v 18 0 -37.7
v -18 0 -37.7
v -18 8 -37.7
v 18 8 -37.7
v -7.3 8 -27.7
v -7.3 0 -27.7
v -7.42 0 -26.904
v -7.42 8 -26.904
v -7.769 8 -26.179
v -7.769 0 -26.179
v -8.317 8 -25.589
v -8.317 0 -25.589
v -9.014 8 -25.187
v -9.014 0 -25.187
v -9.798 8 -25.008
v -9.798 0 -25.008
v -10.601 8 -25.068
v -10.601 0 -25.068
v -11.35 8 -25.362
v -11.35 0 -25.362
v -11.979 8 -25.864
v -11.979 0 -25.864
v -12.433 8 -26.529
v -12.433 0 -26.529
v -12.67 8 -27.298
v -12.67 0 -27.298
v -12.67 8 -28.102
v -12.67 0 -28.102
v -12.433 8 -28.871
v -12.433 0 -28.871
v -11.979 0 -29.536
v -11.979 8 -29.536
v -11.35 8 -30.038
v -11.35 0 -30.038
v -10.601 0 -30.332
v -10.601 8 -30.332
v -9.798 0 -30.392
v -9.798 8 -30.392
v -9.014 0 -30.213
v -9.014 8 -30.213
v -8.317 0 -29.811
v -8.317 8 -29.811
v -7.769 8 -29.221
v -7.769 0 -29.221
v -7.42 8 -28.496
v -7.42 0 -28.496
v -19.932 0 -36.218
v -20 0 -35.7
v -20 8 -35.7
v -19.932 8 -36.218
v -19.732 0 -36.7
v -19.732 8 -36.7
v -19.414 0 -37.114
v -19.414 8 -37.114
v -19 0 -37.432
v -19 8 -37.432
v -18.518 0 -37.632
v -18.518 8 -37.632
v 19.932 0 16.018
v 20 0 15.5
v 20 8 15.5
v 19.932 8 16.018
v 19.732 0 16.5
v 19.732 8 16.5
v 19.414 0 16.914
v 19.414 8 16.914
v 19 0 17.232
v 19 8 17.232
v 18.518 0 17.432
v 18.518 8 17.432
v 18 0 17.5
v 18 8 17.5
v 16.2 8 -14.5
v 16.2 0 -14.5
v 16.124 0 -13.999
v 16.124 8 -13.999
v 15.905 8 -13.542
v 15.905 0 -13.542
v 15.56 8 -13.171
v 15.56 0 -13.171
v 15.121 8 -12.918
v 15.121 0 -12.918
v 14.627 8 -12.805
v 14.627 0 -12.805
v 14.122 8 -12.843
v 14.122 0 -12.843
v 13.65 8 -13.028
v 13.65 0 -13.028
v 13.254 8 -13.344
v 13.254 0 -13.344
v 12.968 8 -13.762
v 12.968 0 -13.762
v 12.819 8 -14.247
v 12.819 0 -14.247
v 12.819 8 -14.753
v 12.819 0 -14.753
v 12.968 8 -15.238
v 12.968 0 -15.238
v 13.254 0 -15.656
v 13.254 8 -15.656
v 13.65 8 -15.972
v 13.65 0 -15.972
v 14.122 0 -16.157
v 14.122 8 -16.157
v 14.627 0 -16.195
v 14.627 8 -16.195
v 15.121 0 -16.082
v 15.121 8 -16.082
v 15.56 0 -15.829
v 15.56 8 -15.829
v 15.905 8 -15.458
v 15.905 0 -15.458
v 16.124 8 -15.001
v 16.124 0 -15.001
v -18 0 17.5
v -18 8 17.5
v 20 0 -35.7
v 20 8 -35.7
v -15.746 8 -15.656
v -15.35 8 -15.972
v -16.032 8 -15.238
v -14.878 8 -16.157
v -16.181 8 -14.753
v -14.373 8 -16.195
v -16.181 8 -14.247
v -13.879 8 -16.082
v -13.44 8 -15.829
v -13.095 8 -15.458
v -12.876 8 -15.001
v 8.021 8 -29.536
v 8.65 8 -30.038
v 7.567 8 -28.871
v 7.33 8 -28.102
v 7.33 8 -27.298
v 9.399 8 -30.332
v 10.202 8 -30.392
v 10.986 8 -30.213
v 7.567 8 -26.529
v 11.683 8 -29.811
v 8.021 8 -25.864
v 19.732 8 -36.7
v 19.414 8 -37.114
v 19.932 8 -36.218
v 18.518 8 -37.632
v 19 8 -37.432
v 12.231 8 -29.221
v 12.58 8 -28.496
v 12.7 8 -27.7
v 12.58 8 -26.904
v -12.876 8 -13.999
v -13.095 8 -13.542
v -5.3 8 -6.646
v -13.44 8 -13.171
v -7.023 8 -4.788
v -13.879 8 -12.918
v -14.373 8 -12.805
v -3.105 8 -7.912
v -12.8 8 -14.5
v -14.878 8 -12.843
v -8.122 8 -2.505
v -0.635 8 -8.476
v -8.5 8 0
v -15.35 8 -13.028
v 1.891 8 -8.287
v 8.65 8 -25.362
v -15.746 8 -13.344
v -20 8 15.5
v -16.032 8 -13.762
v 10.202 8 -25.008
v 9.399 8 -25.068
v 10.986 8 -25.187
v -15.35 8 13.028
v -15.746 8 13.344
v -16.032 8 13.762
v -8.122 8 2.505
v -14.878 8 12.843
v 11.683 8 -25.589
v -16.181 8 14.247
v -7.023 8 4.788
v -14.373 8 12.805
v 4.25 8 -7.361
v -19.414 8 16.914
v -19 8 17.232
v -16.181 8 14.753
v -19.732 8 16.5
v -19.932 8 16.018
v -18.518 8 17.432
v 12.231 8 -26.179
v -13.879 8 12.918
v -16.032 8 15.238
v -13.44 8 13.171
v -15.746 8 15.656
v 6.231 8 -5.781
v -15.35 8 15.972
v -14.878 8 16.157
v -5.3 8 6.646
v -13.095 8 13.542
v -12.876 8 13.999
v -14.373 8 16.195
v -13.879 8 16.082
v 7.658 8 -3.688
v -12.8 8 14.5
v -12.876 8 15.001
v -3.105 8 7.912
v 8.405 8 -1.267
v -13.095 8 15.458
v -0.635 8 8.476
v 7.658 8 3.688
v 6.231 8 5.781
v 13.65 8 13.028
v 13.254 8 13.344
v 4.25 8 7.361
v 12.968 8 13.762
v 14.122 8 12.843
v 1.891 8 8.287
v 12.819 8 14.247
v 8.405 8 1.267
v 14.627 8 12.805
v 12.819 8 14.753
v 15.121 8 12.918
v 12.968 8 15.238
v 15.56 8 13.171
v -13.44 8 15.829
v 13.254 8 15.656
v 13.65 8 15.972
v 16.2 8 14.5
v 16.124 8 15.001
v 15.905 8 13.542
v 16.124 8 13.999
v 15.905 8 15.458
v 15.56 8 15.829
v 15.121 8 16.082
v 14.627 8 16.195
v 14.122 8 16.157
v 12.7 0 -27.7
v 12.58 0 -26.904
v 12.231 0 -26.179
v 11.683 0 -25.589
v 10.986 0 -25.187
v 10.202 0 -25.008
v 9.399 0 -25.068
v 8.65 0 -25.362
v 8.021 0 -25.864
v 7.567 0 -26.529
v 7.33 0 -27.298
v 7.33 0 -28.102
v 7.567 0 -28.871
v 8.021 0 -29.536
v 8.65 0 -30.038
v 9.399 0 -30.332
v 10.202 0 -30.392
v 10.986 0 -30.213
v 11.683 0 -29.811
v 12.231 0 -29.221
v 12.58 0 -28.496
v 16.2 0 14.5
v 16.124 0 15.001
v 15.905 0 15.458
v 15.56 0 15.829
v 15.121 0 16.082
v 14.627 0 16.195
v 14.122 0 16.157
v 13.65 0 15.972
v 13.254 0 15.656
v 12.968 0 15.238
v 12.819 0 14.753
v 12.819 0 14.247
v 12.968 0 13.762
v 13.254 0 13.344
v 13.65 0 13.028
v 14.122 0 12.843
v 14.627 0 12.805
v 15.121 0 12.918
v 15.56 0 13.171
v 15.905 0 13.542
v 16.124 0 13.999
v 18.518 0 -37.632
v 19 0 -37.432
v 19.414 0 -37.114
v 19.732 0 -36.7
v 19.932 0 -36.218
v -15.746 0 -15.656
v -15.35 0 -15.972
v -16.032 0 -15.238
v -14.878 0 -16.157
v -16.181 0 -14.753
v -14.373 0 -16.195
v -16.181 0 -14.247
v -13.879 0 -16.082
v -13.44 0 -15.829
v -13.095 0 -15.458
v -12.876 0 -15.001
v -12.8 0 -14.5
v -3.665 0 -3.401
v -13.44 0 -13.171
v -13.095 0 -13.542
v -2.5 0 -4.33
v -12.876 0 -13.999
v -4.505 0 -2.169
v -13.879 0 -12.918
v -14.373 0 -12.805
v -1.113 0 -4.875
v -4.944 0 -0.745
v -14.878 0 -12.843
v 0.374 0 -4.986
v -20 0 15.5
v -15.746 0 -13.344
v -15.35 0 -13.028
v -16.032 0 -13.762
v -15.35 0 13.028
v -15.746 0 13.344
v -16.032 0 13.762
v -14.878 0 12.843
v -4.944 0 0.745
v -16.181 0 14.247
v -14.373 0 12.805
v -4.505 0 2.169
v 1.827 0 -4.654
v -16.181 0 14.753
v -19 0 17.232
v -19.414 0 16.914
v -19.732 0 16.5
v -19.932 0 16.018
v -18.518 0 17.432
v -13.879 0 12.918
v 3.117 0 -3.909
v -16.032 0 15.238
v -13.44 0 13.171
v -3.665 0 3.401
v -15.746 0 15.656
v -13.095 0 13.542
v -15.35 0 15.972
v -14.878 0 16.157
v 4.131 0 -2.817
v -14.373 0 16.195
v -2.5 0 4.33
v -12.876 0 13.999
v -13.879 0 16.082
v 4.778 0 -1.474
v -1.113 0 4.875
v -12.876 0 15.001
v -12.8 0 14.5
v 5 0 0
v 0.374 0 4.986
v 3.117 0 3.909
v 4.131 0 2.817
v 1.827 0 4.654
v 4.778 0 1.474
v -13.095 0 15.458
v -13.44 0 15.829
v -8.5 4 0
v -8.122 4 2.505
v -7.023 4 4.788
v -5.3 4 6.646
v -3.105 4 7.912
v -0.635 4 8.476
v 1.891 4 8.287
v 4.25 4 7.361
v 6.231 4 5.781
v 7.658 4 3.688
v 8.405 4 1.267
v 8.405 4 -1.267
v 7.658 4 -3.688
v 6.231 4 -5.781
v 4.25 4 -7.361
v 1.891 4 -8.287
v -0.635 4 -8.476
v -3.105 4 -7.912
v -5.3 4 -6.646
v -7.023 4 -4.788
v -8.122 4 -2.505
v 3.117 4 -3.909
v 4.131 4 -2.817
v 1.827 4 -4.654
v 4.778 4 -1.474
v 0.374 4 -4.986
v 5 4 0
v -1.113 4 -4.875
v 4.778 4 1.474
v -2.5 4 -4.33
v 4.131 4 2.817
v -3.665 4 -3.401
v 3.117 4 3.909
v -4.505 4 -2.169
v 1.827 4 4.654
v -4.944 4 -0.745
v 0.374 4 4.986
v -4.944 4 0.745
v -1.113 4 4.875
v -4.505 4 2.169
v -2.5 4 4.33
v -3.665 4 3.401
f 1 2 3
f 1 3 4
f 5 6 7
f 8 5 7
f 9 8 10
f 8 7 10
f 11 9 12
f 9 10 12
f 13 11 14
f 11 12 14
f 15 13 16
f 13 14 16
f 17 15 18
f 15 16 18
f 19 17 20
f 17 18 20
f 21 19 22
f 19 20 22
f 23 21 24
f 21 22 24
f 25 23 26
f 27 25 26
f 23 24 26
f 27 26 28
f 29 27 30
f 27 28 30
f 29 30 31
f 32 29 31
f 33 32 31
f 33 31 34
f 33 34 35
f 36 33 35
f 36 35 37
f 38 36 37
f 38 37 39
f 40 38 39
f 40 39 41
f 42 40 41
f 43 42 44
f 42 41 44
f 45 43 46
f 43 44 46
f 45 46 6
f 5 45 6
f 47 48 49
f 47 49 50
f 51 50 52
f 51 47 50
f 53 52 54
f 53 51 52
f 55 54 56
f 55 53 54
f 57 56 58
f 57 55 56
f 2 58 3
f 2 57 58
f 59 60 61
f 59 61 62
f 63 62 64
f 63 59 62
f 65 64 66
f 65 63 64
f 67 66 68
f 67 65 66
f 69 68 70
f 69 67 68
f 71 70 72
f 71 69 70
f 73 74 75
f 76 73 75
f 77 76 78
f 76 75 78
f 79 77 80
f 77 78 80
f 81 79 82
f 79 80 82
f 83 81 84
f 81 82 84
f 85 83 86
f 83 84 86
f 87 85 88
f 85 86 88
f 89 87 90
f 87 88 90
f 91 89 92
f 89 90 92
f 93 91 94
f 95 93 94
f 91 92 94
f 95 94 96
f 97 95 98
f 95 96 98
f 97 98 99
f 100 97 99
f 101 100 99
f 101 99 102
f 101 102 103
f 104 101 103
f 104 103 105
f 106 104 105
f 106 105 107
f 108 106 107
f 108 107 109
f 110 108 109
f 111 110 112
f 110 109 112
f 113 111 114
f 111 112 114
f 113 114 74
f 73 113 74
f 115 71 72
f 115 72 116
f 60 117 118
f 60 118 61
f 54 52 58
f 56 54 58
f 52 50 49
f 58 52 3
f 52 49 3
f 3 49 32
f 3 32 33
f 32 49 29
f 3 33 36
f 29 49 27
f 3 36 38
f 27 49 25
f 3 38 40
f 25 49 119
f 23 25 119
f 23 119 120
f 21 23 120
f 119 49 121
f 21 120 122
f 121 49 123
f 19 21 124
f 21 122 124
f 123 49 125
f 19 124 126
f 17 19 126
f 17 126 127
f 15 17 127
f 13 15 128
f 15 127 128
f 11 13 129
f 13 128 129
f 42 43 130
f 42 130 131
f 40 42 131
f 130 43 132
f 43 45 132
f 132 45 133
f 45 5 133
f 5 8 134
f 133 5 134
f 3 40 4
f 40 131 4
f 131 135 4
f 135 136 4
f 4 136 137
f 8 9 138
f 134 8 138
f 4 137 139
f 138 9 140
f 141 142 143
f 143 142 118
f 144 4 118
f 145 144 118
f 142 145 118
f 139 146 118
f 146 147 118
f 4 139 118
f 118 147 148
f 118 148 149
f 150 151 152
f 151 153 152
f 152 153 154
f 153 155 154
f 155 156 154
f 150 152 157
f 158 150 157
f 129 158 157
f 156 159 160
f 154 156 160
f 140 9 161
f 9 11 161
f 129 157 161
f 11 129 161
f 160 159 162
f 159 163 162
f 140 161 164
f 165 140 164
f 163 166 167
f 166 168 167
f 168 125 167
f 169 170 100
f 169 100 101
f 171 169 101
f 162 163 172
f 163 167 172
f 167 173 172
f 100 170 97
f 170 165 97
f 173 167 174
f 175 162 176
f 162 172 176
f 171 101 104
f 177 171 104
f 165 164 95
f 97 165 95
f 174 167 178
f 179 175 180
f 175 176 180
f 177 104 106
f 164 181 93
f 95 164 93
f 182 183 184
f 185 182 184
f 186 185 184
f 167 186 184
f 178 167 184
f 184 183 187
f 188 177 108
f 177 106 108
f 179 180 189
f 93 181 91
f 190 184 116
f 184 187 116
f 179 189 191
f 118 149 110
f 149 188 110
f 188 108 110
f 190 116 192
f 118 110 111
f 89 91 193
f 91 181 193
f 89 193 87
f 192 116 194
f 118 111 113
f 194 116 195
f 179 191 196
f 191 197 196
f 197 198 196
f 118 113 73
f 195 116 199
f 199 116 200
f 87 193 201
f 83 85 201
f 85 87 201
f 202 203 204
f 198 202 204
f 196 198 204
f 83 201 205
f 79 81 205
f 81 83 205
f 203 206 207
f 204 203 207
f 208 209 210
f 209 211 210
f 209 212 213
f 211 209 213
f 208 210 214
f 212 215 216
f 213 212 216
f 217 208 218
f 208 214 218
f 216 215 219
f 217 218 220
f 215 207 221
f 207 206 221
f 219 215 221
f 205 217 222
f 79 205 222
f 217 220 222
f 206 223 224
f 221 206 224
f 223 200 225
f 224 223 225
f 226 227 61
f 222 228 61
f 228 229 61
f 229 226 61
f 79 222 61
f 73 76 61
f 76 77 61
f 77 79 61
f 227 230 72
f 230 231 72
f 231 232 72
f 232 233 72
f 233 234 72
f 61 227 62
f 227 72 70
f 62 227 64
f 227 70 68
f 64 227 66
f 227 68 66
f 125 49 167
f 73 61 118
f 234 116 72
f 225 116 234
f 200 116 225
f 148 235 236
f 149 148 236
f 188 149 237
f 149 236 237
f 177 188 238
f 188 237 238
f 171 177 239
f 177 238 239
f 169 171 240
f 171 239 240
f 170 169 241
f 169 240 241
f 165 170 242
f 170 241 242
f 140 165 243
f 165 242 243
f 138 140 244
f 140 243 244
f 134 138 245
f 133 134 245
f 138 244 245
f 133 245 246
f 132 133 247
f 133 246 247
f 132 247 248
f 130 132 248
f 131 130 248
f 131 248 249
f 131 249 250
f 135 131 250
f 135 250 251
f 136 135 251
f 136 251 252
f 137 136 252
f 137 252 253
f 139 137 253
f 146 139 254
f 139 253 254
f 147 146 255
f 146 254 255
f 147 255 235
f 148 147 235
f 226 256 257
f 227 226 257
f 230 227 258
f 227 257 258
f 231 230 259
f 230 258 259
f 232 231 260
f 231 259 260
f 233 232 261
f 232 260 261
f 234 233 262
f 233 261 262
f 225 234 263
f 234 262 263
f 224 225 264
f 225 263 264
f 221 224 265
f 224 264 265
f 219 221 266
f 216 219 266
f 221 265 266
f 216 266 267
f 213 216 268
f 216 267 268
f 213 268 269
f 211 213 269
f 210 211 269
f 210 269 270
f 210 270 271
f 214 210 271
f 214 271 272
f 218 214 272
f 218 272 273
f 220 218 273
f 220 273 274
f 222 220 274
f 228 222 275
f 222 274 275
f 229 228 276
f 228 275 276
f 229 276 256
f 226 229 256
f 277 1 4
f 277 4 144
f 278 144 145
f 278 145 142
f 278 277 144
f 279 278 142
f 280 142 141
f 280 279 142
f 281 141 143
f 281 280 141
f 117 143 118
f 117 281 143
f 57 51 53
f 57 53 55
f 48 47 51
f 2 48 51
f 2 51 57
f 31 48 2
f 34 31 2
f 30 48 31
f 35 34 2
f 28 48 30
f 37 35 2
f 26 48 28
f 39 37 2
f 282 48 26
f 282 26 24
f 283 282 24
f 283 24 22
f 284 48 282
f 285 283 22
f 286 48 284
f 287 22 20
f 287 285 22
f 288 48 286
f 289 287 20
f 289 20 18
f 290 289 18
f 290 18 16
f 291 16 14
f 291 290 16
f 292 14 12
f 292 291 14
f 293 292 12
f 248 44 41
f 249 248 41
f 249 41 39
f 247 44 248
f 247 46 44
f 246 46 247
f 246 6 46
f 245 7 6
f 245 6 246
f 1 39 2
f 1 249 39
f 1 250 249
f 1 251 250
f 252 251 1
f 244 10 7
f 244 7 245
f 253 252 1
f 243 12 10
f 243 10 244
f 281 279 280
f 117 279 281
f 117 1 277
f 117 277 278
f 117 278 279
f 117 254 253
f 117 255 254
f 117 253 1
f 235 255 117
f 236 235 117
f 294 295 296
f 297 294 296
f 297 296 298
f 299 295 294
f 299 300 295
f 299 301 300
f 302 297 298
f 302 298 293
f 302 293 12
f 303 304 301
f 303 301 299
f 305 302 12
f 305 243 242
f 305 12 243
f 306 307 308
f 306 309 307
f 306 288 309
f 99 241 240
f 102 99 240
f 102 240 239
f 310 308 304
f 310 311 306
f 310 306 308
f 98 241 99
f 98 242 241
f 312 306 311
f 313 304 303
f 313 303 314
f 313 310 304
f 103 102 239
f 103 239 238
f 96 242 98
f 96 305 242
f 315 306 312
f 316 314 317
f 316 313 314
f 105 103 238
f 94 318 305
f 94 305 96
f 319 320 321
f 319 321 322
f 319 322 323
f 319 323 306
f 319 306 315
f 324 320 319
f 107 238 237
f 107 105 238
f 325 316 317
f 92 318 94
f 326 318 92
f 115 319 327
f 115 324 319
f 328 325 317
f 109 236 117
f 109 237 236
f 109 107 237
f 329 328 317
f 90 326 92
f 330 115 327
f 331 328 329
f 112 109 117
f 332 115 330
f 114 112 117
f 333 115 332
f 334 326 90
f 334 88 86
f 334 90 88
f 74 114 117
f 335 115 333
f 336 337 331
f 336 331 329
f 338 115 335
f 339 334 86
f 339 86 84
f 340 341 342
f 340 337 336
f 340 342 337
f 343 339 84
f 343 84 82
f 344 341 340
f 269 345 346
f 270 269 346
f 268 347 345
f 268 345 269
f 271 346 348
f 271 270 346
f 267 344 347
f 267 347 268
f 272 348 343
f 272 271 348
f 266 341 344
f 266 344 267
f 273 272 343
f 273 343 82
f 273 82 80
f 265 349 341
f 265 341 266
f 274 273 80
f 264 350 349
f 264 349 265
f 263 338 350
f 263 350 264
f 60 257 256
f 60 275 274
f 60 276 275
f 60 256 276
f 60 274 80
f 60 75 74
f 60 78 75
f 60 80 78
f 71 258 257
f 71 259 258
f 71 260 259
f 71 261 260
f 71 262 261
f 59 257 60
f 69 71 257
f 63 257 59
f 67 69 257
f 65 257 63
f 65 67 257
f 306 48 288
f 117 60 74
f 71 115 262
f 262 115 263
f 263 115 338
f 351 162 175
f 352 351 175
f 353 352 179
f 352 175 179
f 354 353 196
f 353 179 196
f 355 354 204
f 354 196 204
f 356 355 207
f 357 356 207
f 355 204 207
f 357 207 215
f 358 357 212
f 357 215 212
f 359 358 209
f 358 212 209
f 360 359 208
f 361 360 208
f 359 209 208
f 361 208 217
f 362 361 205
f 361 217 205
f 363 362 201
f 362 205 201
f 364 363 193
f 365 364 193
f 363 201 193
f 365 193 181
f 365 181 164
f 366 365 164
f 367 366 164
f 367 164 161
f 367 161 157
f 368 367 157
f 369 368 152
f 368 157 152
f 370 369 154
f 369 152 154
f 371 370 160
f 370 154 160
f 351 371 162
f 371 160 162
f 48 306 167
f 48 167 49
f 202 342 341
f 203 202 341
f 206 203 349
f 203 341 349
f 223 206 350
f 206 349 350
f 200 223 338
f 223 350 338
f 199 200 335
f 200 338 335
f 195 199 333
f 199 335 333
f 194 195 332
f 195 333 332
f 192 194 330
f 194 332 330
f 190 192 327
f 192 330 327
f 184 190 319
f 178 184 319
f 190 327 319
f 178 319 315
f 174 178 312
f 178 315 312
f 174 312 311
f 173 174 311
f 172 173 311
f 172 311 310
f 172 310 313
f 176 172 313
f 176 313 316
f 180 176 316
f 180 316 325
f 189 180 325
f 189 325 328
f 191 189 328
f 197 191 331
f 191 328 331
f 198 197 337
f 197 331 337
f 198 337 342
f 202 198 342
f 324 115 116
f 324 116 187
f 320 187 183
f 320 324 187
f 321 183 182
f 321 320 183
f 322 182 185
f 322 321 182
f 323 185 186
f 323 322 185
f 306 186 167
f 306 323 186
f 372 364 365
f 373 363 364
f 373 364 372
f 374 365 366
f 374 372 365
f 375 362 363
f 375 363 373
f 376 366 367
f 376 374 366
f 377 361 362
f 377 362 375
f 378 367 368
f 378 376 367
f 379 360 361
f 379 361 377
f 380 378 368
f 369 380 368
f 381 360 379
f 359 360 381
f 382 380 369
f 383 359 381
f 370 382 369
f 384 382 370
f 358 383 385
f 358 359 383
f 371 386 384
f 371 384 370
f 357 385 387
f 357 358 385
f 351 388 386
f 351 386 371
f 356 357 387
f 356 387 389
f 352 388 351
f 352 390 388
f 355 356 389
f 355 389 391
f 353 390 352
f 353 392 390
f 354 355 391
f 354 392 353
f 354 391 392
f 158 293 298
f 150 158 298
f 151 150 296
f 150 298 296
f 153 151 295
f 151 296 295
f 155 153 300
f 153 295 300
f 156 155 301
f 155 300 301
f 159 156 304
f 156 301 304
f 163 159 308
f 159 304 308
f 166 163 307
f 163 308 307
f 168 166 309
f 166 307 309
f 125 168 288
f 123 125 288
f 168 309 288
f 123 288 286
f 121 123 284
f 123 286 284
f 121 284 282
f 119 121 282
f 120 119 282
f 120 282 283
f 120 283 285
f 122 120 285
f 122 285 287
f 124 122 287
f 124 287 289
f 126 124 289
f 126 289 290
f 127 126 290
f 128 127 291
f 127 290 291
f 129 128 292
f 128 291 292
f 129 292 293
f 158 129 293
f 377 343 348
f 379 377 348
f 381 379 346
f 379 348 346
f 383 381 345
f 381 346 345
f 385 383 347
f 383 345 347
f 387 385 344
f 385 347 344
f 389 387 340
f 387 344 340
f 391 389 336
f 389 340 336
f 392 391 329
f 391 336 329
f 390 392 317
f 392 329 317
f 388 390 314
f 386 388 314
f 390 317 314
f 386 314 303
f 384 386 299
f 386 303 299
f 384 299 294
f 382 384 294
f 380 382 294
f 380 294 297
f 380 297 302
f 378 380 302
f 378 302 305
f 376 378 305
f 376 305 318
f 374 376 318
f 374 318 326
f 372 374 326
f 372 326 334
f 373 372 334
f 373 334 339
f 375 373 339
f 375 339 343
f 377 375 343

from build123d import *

# Parameters (mm, degrees)
F0_R     = 2.7
F0_R_2   = 1.7
F0_R_3   = 5
F1_DEPTH = 8
F2_R     = 8.5
F3_DEPTH = 4


with BuildPart() as f1:
    # F0 (on Front) → F1 (new body)
    with BuildSketch(Plane.XZ):
        with BuildLine():
            ThreePointArc((-18, 17.5), (-19.414214, 16.914214), (-20, 15.5))
            Line((-20, 15.5), (-20, -35.7))
            ThreePointArc((-20, -35.7), (-19.414214, -37.114214), (-18, -37.7))
            Line((-18, -37.7), (18, -37.7))
            ThreePointArc((18, -37.7), (19.414214, -37.114214), (20, -35.7))
            Line((20, -35.7), (20, 15.5))
            ThreePointArc((20, 15.5), (19.414214, 16.914214), (18, 17.5))
            Line((18, 17.5), (-18, 17.5))
        make_face()
        with Locations((-10, -27.7)):
            Circle(F0_R, mode=Mode.SUBTRACT)
        with Locations((-14.5, -14.5)):
            Circle(F0_R_2, mode=Mode.SUBTRACT)
        with Locations((10, -27.7)):
            Circle(F0_R, mode=Mode.SUBTRACT)
        with Locations((14.5, -14.5)):
            Circle(F0_R_2, mode=Mode.SUBTRACT)
        with Locations((-14.5, 14.5)):
            Circle(F0_R_2, mode=Mode.SUBTRACT)
        Circle(F0_R_3, mode=Mode.SUBTRACT)
        with Locations((14.5, 14.5)):
            Circle(F0_R_2, mode=Mode.SUBTRACT)
    extrude(amount=-F1_DEPTH)

    # F2 (on face) → F3 (cut)
    with BuildSketch(Plane(origin=(0, 8, 0), x_dir=(-1, 0, 0), z_dir=(0, 1, 0))):
        Circle(F2_R)
    extrude(amount=-F3_DEPTH, mode=Mode.SUBTRACT)


solid = f1.part
